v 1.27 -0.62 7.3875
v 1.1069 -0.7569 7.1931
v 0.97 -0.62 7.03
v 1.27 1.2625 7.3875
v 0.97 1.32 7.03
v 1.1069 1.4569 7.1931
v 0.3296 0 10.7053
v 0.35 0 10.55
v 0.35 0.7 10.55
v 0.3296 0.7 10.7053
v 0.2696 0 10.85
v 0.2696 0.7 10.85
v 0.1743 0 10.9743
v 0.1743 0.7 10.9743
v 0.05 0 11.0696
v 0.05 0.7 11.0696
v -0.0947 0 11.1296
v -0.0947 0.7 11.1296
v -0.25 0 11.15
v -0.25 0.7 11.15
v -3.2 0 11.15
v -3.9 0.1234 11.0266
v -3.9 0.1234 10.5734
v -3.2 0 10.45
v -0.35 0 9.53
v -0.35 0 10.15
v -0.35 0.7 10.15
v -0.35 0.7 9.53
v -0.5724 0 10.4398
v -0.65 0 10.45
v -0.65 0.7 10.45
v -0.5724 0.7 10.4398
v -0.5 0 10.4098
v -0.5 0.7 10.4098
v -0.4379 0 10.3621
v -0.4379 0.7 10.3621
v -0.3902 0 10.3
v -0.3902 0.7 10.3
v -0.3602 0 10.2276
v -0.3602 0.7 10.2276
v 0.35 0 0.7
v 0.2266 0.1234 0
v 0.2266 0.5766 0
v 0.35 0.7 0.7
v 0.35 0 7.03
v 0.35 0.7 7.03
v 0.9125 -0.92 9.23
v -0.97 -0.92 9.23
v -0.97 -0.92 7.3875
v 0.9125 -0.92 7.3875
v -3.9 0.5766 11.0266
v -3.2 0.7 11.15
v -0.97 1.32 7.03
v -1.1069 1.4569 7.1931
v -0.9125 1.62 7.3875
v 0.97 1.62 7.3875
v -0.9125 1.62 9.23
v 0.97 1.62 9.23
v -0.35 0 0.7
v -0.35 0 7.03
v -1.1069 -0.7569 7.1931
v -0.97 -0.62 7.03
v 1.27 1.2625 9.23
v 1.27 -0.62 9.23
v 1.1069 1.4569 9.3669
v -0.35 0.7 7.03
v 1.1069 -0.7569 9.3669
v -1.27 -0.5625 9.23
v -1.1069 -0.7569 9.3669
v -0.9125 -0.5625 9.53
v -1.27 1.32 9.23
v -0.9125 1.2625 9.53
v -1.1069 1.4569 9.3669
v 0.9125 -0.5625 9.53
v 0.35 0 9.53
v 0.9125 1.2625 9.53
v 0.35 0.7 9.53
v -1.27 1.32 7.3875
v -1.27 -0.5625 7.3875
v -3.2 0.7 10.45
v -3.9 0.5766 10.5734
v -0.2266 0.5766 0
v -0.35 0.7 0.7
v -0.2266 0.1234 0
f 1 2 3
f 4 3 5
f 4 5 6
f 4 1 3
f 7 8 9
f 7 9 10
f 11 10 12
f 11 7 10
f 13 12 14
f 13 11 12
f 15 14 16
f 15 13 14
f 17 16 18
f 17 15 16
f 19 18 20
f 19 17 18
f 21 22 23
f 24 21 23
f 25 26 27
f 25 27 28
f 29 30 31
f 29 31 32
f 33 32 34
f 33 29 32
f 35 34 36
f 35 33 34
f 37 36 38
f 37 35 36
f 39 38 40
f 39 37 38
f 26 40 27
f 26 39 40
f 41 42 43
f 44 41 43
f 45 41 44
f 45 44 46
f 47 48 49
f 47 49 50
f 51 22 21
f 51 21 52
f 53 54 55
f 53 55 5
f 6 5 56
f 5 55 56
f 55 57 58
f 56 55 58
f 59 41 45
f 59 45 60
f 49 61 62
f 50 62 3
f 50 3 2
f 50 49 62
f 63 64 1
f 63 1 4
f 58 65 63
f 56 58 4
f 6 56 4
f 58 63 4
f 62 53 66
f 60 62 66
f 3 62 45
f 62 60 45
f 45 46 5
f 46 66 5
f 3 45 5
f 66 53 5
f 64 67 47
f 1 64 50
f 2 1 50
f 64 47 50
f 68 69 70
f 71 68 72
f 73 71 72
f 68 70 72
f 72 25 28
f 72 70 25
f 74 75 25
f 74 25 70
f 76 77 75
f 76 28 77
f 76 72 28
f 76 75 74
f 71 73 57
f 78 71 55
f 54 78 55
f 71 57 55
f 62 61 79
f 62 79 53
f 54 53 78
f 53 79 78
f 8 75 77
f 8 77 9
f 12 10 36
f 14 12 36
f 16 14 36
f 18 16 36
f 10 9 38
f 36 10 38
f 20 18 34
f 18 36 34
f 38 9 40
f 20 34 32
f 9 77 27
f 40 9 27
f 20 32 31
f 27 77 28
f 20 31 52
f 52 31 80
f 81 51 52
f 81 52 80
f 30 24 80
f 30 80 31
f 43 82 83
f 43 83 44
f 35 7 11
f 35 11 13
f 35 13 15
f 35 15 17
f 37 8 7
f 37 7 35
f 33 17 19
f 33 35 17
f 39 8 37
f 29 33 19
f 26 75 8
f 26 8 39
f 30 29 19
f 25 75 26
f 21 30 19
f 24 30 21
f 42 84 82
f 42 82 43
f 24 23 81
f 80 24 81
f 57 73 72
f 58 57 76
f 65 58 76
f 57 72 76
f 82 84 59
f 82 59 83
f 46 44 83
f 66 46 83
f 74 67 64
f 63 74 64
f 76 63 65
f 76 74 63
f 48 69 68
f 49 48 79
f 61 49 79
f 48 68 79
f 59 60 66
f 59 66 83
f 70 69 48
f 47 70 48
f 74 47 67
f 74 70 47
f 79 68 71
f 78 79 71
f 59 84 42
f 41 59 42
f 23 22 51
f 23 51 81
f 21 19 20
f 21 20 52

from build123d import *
from OCP.BRepFilletAPI import BRepFilletAPI_MakeChamfer

# Parameters (mm, degrees)
EXTRUDE_1_DEPTH = 0.7
CHAMFER_1_SIZE  = 0.7
CHAMFER_1_SIZE2 = 0.123428886
CHAMFER_2_SIZE  = 0.7
CHAMFER_2_SIZE2 = 0.123428886
SKETCH_2_W      = 2.54
SKETCH_2_H      = 2.54
EXTRUDE_2_DEPTH = 2.5
CHAMFER_3_SIZE  = 0.3
CHAMFER_3_SIZE2 = 0.357526078
CHAMFER_4_SIZE  = 0.3
CHAMFER_4_SIZE2 = 0.357526078
CHAMFER_5_SIZE  = 0.3
CHAMFER_5_SIZE2 = 0.357526078


with BuildPart() as part:
    # Эскиз1 → Бобышка-Вытянуть1 (new body)
    with BuildSketch(Plane(origin=(0, 0, 0), x_dir=(1, 0, 0), z_dir=(0, 1, 0))):
        with BuildLine():
            Line((0.35, 0), (0.35, -10.55))
            ThreePointArc((0.35, -10.55), (0.174264069, -10.974264069), (-0.25, -11.15))
            Line((-0.25, -11.15), (-3.9, -11.15))
            Line((-3.9, -11.15), (-3.9, -10.45))
            Line((-3.9, -10.45), (-0.65, -10.45))
            ThreePointArc((-0.65, -10.45), (-0.437867966, -10.362132034), (-0.35, -10.15))
            Line((-0.35, -10.15), (-0.35, 0))
            Line((-0.35, 0), (0.35, 0))
        make_face()
    extrude(amount=EXTRUDE_1_DEPTH)

    # Фаска1: one chamfer whose edges measure the first distance from different faces: ONE call of the kernel's chamfer builder (chamfer() names one face for all edges)
    chamfer_1_edges_1 = [part.edges().sort_by_distance(p)[0] for p in [
        (0, 0, 0),
    ]]
    chamfer_1_side_1 = [part.faces().sort_by_distance(p)[0] for p in [
        (-0.230674814, 0, 5.075),
    ]]
    chamfer_1_edges_2 = [part.edges().sort_by_distance(p)[0] for p in [
        (0.35, 0.35, 0),
    ]]
    chamfer_1_side_2 = [part.faces().sort_by_distance(p)[0] for p in [
        (0.35, 0.35, 5.275),
    ]]
    chamfer_1_edges_3 = [part.edges().sort_by_distance(p)[0] for p in [
        (-0.35, 0.35, 0),
    ]]
    chamfer_1_side_3 = [part.faces().sort_by_distance(p)[0] for p in [
        (-0.35, 0.35, 5.075),
    ]]
    chamfer_1_edges_4 = [part.edges().sort_by_distance(p)[0] for p in [
        (0, 0.7, 0),
    ]]
    chamfer_1_side_4 = [part.faces().sort_by_distance(p)[0] for p in [
        (-0.230674814, 0.7, 5.075),
    ]]
    chamfer_1 = BRepFilletAPI_MakeChamfer(part.part.solid().wrapped)
    for e in chamfer_1_edges_1:
        chamfer_1.Add(CHAMFER_1_SIZE, CHAMFER_1_SIZE2, e.wrapped, chamfer_1_side_1[0].wrapped)  # the first distance lies on this face
    for e in chamfer_1_edges_2:
        chamfer_1.Add(CHAMFER_1_SIZE, CHAMFER_1_SIZE2, e.wrapped, chamfer_1_side_2[0].wrapped)  # the first distance lies on this face
    for e in chamfer_1_edges_3:
        chamfer_1.Add(CHAMFER_1_SIZE, CHAMFER_1_SIZE2, e.wrapped, chamfer_1_side_3[0].wrapped)  # the first distance lies on this face
    for e in chamfer_1_edges_4:
        chamfer_1.Add(CHAMFER_1_SIZE, CHAMFER_1_SIZE2, e.wrapped, chamfer_1_side_4[0].wrapped)  # the first distance lies on this face
    add(Compound.cast(chamfer_1.Shape()), mode=Mode.REPLACE)

    # Фаска2: one chamfer whose edges measure the first distance from different faces: ONE call of the kernel's chamfer builder (chamfer() names one face for all edges)
    chamfer_2_edges_1 = [part.edges().sort_by_distance(p)[0] for p in [
        (-3.9, 0.35, 11.15),
    ]]
    chamfer_2_side_1 = [part.faces().sort_by_distance(p)[0] for p in [
        (-2.075, 0.35, 11.15),
    ]]
    chamfer_2_edges_2 = [part.edges().sort_by_distance(p)[0] for p in [
        (-3.9, 0.35, 10.45),
    ]]
    chamfer_2_side_2 = [part.faces().sort_by_distance(p)[0] for p in [
        (-2.275, 0.35, 10.45),
    ]]
    chamfer_2_edges_3 = [part.edges().sort_by_distance(p)[0] for p in [
        (-3.9, 0.7, 10.8),
    ]]
    chamfer_2_side_3 = [part.faces().sort_by_distance(p)[0] for p in [
        (-0.23718821, 0.7, 5.425),
    ]]
    chamfer_2_edges_4 = [part.edges().sort_by_distance(p)[0] for p in [
        (-3.9, 0, 10.8),
    ]]
    chamfer_2_side_4 = [part.faces().sort_by_distance(p)[0] for p in [
        (-0.23718821, 0, 5.425),
    ]]
    chamfer_2 = BRepFilletAPI_MakeChamfer(part.part.solid().wrapped)
    for e in chamfer_2_edges_1:
        chamfer_2.Add(CHAMFER_2_SIZE, CHAMFER_2_SIZE2, e.wrapped, chamfer_2_side_1[0].wrapped)  # the first distance lies on this face
    for e in chamfer_2_edges_2:
        chamfer_2.Add(CHAMFER_2_SIZE, CHAMFER_2_SIZE2, e.wrapped, chamfer_2_side_2[0].wrapped)  # the first distance lies on this face
    for e in chamfer_2_edges_3:
        chamfer_2.Add(CHAMFER_2_SIZE, CHAMFER_2_SIZE2, e.wrapped, chamfer_2_side_3[0].wrapped)  # the first distance lies on this face
    for e in chamfer_2_edges_4:
        chamfer_2.Add(CHAMFER_2_SIZE, CHAMFER_2_SIZE2, e.wrapped, chamfer_2_side_4[0].wrapped)  # the first distance lies on this face
    add(Compound.cast(chamfer_2.Shape()), mode=Mode.REPLACE)

    # Эскиз2 → Бобышка-Вытянуть2 (add)
    with BuildSketch(Plane.XY.offset(9.53)):
        with Locations((0, 0.35)):
            Rectangle(SKETCH_2_W, SKETCH_2_H)
    extrude(amount=-EXTRUDE_2_DEPTH)

    # Фаска3
    chamfer_3_edges = [part.edges().sort_by_distance(p)[0] for p in [
        (-1.27, 0.35, 7.03),
        (0, 1.62, 7.03),
        (1.27, 0.35, 7.03),
        (0, -0.92, 7.03),
    ]]
    chamfer_3_side = [part.faces().sort_by_distance(p)[0] for p in [
        (0, -0.884078976, 7.03),
    ]]
    chamfer(chamfer_3_edges, length=CHAMFER_3_SIZE, length2=CHAMFER_3_SIZE2, reference=chamfer_3_side[0])

    # Фаска4: one chamfer whose edges measure the first distance from different faces: ONE call of the kernel's chamfer builder (chamfer() names one face for all edges)
    chamfer_4_edges_1 = [part.edges().sort_by_distance(p)[0] for p in [
        (-1.27, 0.35, 9.53),
    ]]
    chamfer_4_side_1 = [part.faces().sort_by_distance(p)[0] for p in [
        (-1.27, 0.35, 8.458763039),
    ]]
    chamfer_4_edges_2 = [part.edges().sort_by_distance(p)[0] for p in [
        (0, -0.92, 9.53),
    ]]
    chamfer_4_side_2 = [part.faces().sort_by_distance(p)[0] for p in [
        (0, -0.92, 8.458763039),
    ]]
    chamfer_4_edges_3 = [part.edges().sort_by_distance(p)[0] for p in [
        (1.27, 0.35, 9.53),
    ]]
    chamfer_4_side_3 = [part.faces().sort_by_distance(p)[0] for p in [
        (1.27, 0.35, 8.458763039),
    ]]
    chamfer_4_edges_4 = [part.edges().sort_by_distance(p)[0] for p in [
        (0, 1.62, 9.53),
    ]]
    chamfer_4_side_4 = [part.faces().sort_by_distance(p)[0] for p in [
        (0, 1.62, 8.458763039),
    ]]
    chamfer_4 = BRepFilletAPI_MakeChamfer(part.part.solid().wrapped)
    for e in chamfer_4_edges_1:
        chamfer_4.Add(CHAMFER_4_SIZE, CHAMFER_4_SIZE2, e.wrapped, chamfer_4_side_1[0].wrapped)  # the first distance lies on this face
    for e in chamfer_4_edges_2:
        chamfer_4.Add(CHAMFER_4_SIZE, CHAMFER_4_SIZE2, e.wrapped, chamfer_4_side_2[0].wrapped)  # the first distance lies on this face
    for e in chamfer_4_edges_3:
        chamfer_4.Add(CHAMFER_4_SIZE, CHAMFER_4_SIZE2, e.wrapped, chamfer_4_side_3[0].wrapped)  # the first distance lies on this face
    for e in chamfer_4_edges_4:
        chamfer_4.Add(CHAMFER_4_SIZE, CHAMFER_4_SIZE2, e.wrapped, chamfer_4_side_4[0].wrapped)  # the first distance lies on this face
    add(Compound.cast(chamfer_4.Shape()), mode=Mode.REPLACE)

    # Фаска5: one chamfer whose edges measure the first distance from different faces: ONE call of the kernel's chamfer builder (chamfer() names one face for all edges)
    chamfer_5_edges_1 = [part.edges().sort_by_distance(p)[0] for p in [
        (-1.27, -0.92, 8.308763039),
    ]]
    chamfer_5_side_1 = [part.faces().sort_by_distance(p)[0] for p in [
        (0, -0.92, 8.308763039),
    ]]
    chamfer_5_edges_2 = [part.edges().sort_by_distance(p)[0] for p in [
        (1.27, -0.92, 8.308763039),
    ]]
    chamfer_5_side_2 = [part.faces().sort_by_distance(p)[0] for p in [
        (1.27, 0.35, 8.308763039),
    ]]
    chamfer_5_edges_3 = [part.edges().sort_by_distance(p)[0] for p in [
        (-1.27, 1.62, 8.308763039),
    ]]
    chamfer_5_side_3 = [part.faces().sort_by_distance(p)[0] for p in [
        (-1.27, 0.35, 8.308763039),
    ]]
    chamfer_5_edges_4 = [part.edges().sort_by_distance(p)[0] for p in [
        (1.27, 1.62, 8.308763039),
    ]]
    chamfer_5_side_4 = [part.faces().sort_by_distance(p)[0] for p in [
        (0, 1.62, 8.308763039),
    ]]
    chamfer_5 = BRepFilletAPI_MakeChamfer(part.part.solid().wrapped)
    for e in chamfer_5_edges_1:
        chamfer_5.Add(CHAMFER_5_SIZE, CHAMFER_5_SIZE2, e.wrapped, chamfer_5_side_1[0].wrapped)  # the first distance lies on this face
    for e in chamfer_5_edges_2:
        chamfer_5.Add(CHAMFER_5_SIZE, CHAMFER_5_SIZE2, e.wrapped, chamfer_5_side_2[0].wrapped)  # the first distance lies on this face
    for e in chamfer_5_edges_3:
        chamfer_5.Add(CHAMFER_5_SIZE, CHAMFER_5_SIZE2, e.wrapped, chamfer_5_side_3[0].wrapped)  # the first distance lies on this face
    for e in chamfer_5_edges_4:
        chamfer_5.Add(CHAMFER_5_SIZE, CHAMFER_5_SIZE2, e.wrapped, chamfer_5_side_4[0].wrapped)  # the first distance lies on this face
    add(Compound.cast(chamfer_5.Shape()), mode=Mode.REPLACE)


solid = part.part
